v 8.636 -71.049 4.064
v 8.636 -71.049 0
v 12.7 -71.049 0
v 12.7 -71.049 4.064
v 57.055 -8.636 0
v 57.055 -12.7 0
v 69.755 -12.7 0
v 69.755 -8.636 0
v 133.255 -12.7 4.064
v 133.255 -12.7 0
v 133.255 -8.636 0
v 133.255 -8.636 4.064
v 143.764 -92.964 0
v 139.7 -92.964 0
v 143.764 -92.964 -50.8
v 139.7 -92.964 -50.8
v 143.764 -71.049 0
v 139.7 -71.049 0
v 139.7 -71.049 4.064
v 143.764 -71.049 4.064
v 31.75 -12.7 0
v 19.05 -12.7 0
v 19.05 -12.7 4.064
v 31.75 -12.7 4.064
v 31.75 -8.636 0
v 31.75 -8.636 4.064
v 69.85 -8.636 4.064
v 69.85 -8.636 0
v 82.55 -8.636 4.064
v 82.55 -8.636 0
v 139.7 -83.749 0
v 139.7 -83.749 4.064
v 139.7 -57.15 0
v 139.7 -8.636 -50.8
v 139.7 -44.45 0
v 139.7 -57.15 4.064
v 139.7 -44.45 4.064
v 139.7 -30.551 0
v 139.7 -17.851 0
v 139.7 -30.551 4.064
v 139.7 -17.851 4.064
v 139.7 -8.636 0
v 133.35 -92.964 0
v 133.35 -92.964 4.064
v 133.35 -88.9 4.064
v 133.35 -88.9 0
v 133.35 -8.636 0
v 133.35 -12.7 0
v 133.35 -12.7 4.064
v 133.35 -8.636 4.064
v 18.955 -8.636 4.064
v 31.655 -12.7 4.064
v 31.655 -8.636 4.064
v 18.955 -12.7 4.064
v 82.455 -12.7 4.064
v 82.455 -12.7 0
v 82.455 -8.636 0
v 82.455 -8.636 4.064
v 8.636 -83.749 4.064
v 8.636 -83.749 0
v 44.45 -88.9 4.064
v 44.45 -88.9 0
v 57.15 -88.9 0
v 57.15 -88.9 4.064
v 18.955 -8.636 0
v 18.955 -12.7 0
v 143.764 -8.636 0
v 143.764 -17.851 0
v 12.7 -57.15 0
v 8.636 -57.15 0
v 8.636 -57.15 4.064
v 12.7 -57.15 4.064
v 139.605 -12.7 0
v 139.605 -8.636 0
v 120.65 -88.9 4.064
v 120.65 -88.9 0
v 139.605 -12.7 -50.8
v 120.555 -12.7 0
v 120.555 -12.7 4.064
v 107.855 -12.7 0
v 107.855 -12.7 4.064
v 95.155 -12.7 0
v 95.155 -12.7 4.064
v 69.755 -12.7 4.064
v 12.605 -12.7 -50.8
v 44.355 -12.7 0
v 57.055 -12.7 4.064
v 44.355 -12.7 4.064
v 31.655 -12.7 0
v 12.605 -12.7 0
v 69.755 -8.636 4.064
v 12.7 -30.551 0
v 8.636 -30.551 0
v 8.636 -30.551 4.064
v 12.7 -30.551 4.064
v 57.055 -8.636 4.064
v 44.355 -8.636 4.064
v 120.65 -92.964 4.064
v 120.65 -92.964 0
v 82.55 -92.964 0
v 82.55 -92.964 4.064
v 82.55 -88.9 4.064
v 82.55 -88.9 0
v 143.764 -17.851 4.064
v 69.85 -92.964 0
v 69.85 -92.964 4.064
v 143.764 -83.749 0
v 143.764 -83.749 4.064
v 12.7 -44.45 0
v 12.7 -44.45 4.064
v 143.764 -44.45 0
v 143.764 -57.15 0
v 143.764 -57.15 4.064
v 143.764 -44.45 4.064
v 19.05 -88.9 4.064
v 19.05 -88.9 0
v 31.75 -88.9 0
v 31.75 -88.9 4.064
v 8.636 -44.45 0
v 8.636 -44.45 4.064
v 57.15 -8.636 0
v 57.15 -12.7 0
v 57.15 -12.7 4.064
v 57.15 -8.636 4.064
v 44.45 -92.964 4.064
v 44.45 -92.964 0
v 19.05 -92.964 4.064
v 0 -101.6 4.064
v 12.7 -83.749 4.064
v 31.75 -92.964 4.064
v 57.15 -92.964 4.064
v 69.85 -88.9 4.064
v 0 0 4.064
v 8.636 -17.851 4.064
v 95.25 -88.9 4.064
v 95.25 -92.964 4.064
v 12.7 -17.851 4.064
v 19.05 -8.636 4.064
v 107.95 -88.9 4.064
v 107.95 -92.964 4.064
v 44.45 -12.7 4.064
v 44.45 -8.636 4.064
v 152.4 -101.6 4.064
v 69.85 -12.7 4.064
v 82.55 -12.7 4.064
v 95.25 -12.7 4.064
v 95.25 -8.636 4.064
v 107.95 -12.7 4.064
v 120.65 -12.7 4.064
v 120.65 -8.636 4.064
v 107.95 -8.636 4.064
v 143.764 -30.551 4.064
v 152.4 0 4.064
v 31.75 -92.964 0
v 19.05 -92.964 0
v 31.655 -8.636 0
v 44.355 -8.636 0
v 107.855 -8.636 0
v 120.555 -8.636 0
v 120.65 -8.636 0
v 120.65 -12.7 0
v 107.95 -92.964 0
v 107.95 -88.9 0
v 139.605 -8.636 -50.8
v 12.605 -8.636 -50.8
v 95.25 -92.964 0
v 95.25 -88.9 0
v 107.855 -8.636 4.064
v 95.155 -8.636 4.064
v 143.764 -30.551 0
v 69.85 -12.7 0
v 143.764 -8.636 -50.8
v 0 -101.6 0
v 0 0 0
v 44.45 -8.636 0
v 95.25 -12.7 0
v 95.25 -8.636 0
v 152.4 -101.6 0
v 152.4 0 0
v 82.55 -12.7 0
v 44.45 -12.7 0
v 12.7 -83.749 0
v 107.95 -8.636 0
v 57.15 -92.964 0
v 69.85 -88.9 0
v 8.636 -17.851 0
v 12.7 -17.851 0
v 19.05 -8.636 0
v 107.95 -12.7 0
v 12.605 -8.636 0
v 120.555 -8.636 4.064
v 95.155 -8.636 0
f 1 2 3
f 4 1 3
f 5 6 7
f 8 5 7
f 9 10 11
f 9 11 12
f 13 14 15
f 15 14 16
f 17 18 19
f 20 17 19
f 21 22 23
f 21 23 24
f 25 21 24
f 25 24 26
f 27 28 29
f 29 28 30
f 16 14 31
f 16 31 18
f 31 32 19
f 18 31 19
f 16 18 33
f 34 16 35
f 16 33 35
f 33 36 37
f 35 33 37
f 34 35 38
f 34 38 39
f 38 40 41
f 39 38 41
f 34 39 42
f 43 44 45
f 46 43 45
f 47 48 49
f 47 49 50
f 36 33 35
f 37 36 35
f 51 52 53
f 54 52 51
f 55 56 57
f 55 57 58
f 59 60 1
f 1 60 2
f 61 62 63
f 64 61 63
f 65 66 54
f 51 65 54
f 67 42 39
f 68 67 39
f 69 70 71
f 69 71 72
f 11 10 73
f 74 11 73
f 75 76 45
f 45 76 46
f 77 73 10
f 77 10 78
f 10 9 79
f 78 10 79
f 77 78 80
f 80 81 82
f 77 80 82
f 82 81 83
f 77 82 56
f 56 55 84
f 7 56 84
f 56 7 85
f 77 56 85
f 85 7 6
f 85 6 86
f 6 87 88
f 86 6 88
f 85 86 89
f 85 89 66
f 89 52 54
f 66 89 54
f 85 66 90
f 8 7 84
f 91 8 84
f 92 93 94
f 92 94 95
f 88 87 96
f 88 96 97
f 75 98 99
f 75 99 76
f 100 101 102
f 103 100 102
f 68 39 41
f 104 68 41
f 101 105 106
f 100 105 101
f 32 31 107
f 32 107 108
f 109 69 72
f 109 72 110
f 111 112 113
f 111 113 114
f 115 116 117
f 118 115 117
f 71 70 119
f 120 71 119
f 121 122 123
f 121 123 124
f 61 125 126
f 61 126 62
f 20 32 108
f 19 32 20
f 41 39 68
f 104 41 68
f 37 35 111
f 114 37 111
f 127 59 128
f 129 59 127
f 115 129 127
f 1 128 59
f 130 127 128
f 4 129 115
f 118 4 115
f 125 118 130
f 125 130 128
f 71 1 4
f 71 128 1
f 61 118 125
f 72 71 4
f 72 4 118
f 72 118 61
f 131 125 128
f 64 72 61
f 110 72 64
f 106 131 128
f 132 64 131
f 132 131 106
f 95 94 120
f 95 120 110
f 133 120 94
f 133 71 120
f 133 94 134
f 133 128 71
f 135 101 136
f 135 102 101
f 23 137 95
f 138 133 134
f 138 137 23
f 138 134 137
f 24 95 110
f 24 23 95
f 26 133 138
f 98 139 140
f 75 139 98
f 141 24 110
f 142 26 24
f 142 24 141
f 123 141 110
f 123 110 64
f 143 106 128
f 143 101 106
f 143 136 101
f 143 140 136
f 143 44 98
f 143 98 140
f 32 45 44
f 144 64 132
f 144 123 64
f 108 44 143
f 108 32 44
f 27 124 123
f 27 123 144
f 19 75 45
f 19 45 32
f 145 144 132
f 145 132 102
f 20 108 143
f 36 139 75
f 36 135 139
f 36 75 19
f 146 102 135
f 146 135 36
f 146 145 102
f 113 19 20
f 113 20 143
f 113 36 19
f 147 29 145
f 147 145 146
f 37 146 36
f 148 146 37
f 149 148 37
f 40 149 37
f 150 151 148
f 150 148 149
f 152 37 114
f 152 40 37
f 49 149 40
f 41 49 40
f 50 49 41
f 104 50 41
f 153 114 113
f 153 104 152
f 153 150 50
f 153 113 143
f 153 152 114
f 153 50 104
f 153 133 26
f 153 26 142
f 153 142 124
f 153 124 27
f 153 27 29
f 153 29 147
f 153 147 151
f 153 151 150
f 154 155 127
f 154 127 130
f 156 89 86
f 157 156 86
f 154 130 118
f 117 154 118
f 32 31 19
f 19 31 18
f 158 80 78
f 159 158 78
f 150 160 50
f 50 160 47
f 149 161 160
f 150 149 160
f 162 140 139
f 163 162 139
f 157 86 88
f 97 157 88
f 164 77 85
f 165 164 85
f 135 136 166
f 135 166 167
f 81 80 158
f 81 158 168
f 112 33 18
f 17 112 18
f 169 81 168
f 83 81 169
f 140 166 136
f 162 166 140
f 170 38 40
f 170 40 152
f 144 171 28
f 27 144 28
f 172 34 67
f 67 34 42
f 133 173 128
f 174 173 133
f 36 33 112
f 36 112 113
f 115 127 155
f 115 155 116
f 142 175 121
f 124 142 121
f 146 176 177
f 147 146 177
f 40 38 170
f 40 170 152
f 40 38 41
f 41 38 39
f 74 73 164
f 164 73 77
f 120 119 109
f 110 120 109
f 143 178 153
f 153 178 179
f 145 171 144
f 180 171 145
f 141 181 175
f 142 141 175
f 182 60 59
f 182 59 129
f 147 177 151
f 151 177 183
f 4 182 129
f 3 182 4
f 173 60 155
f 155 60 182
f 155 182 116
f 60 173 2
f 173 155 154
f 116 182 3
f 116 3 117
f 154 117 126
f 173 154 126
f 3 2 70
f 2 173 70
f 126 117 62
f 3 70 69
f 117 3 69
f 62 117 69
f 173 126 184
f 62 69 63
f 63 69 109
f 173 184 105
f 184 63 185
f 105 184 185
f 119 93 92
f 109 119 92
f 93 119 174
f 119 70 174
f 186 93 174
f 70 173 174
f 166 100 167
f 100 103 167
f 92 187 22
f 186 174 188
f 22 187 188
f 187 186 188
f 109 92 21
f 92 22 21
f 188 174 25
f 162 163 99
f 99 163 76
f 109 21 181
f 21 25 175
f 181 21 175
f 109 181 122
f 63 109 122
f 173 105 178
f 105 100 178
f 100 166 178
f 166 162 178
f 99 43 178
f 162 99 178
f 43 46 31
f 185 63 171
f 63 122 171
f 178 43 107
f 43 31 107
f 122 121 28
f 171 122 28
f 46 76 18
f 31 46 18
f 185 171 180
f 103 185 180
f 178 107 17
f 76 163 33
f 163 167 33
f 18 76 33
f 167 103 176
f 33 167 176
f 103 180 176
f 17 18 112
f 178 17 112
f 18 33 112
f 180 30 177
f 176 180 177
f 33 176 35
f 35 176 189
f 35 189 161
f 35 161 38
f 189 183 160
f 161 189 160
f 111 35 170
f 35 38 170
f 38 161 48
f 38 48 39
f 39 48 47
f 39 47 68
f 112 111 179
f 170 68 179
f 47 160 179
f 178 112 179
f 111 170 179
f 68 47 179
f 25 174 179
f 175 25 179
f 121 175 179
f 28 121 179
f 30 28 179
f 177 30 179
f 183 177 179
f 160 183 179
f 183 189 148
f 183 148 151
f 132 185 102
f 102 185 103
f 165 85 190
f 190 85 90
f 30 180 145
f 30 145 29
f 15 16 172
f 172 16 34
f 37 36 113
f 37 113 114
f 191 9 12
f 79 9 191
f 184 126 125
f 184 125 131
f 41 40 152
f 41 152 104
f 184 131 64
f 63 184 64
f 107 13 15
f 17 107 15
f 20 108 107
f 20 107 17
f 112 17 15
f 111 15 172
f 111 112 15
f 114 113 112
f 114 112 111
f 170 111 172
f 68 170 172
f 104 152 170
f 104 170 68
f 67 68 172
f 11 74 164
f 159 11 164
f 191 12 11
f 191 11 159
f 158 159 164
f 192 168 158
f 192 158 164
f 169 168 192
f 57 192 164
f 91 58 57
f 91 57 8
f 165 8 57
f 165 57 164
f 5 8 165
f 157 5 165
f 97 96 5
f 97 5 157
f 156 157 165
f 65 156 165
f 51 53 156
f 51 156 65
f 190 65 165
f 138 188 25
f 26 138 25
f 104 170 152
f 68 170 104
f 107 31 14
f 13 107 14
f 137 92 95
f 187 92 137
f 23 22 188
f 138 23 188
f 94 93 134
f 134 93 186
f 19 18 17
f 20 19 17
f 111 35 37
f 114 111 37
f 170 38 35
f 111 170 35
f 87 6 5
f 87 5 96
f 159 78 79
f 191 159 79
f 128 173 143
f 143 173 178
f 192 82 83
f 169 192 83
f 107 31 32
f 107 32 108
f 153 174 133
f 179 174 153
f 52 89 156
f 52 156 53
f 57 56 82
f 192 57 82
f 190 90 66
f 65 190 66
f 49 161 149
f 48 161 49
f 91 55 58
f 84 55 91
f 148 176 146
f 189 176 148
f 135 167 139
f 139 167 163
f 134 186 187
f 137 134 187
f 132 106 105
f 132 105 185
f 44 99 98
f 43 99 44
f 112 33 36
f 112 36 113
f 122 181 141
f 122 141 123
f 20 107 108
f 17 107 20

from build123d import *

# Parameters (mm, degrees)
F1_W     = 152.4
F1_H     = 101.6
F1_W_2   = 12.7
F1_H_2   = 4.064
F1_W_3   = 4.064
F1_H_3   = 12.7
F2_DEPTH = 4.064
F3_W     = 12.7
F3_H     = 4.064
F4_DEPTH = 4.064
F5_W     = 12.7
F5_H     = 4.064
F6_DEPTH = 4.064


with BuildPart() as f2:
    # F1 (on Top) → F2 (new body)
    with BuildSketch(Plane.XY):
        with Locations((76.2, -50.8)):
            Rectangle(F1_W, F1_H)
        with Locations((25.4, -90.932)):
            Rectangle(F1_W_2, F1_H_2, mode=Mode.SUBTRACT)
        with Locations((10.668, -77.3989244119)):
            Rectangle(F1_W_3, F1_H_3, mode=Mode.SUBTRACT)
        with Locations((50.8, -90.932)):
            Rectangle(F1_W_2, F1_H_2, mode=Mode.SUBTRACT)
        with Locations((76.2, -90.932)):
            Rectangle(F1_W_2, F1_H_2, mode=Mode.SUBTRACT)
        with Locations((10.668, -50.8)):
            Rectangle(F1_W_3, F1_H_3, mode=Mode.SUBTRACT)
        with Locations((101.6, -90.932)):
            Rectangle(F1_W_2, F1_H_2, mode=Mode.SUBTRACT)
        with Locations((127, -90.932)):
            Rectangle(F1_W_2, F1_H_2, mode=Mode.SUBTRACT)
        with Locations((141.732, -77.3989244119)):
            Rectangle(F1_W_3, F1_H_3, mode=Mode.SUBTRACT)
        with Locations((141.732, -50.8)):
            Rectangle(F1_W_3, F1_H_3, mode=Mode.SUBTRACT)
        with Locations((10.668, -24.2010755881)):
            Rectangle(F1_W_3, F1_H_3, mode=Mode.SUBTRACT)
        with Locations((25.4, -10.668)):
            Rectangle(F1_W_2, F1_H_2, mode=Mode.SUBTRACT)
        with Locations((50.8, -10.668)):
            Rectangle(F1_W_2, F1_H_2, mode=Mode.SUBTRACT)
        with Locations((76.2, -10.668)):
            Rectangle(F1_W_2, F1_H_2, mode=Mode.SUBTRACT)
        with Locations((101.6, -10.668)):
            Rectangle(F1_W_2, F1_H_2, mode=Mode.SUBTRACT)
        with Locations((141.732, -24.2010755881)):
            Rectangle(F1_W_3, F1_H_3, mode=Mode.SUBTRACT)
        with Locations((127, -10.668)):
            Rectangle(F1_W_2, F1_H_2, mode=Mode.SUBTRACT)
    extrude(amount=F2_DEPTH)


with BuildPart() as f4:
    # F3 (on face) → F4 (new body)
    with BuildSketch(Plane(origin=(0, -12.7, 0), x_dir=(-1, 0, 0), z_dir=(0, 1, 0))):
        Polygon((-12.6052666744, -50.8), (-12.6052666744, 0), (-18.9552666744, 0), (-31.6552666744, 0), (-44.3552666744, 0), (-57.0552666744, 0), (-69.7552666744, 0), (-82.4552666744, 0), (-95.1552666744, 0), (-107.8552666744, 0), (-120.5552666744, 0), (-133.2552666744, 0), (-139.6052666744, 0), (-139.6052666744, -50.8), align=None)
        with Locations((-25.3052666744, 2.032)):
            Rectangle(F3_W, F3_H)
        with Locations((-50.7052666744, 2.032)):
            Rectangle(F3_W, F3_H)
        with Locations((-126.9052666744, 2.032)):
            Rectangle(F3_W, F3_H)
        with Locations((-76.1052666744, 2.032)):
            Rectangle(F3_W, F3_H)
        with Locations((-101.5052666744, 2.032)):
            Rectangle(F3_W, F3_H)
    extrude(amount=F4_DEPTH)


with BuildPart() as f6:
    # F5 (on face) → F6 (new body)
    with BuildSketch(Plane.YZ.offset(139.7)):
        with Locations((-50.8, 2.032)):
            Rectangle(F5_W, F5_H)
        with Locations((-24.2010755881, 2.032)):
            Rectangle(F5_W, F5_H)
        with Locations((-77.3989244119, 2.032)):
            Rectangle(F5_W, F5_H)
        Polygon((-8.636, -50.8), (-8.636, 0), (-17.8510755881, 0), (-30.5510755881, 0), (-44.45, 0), (-57.15, 0), (-71.0489244119, 0), (-83.7489244119, 0), (-92.964, 0), (-92.964, -50.8), align=None)
    extrude(amount=F6_DEPTH)


solid = Compound([f2.part, f4.part, f6.part])
